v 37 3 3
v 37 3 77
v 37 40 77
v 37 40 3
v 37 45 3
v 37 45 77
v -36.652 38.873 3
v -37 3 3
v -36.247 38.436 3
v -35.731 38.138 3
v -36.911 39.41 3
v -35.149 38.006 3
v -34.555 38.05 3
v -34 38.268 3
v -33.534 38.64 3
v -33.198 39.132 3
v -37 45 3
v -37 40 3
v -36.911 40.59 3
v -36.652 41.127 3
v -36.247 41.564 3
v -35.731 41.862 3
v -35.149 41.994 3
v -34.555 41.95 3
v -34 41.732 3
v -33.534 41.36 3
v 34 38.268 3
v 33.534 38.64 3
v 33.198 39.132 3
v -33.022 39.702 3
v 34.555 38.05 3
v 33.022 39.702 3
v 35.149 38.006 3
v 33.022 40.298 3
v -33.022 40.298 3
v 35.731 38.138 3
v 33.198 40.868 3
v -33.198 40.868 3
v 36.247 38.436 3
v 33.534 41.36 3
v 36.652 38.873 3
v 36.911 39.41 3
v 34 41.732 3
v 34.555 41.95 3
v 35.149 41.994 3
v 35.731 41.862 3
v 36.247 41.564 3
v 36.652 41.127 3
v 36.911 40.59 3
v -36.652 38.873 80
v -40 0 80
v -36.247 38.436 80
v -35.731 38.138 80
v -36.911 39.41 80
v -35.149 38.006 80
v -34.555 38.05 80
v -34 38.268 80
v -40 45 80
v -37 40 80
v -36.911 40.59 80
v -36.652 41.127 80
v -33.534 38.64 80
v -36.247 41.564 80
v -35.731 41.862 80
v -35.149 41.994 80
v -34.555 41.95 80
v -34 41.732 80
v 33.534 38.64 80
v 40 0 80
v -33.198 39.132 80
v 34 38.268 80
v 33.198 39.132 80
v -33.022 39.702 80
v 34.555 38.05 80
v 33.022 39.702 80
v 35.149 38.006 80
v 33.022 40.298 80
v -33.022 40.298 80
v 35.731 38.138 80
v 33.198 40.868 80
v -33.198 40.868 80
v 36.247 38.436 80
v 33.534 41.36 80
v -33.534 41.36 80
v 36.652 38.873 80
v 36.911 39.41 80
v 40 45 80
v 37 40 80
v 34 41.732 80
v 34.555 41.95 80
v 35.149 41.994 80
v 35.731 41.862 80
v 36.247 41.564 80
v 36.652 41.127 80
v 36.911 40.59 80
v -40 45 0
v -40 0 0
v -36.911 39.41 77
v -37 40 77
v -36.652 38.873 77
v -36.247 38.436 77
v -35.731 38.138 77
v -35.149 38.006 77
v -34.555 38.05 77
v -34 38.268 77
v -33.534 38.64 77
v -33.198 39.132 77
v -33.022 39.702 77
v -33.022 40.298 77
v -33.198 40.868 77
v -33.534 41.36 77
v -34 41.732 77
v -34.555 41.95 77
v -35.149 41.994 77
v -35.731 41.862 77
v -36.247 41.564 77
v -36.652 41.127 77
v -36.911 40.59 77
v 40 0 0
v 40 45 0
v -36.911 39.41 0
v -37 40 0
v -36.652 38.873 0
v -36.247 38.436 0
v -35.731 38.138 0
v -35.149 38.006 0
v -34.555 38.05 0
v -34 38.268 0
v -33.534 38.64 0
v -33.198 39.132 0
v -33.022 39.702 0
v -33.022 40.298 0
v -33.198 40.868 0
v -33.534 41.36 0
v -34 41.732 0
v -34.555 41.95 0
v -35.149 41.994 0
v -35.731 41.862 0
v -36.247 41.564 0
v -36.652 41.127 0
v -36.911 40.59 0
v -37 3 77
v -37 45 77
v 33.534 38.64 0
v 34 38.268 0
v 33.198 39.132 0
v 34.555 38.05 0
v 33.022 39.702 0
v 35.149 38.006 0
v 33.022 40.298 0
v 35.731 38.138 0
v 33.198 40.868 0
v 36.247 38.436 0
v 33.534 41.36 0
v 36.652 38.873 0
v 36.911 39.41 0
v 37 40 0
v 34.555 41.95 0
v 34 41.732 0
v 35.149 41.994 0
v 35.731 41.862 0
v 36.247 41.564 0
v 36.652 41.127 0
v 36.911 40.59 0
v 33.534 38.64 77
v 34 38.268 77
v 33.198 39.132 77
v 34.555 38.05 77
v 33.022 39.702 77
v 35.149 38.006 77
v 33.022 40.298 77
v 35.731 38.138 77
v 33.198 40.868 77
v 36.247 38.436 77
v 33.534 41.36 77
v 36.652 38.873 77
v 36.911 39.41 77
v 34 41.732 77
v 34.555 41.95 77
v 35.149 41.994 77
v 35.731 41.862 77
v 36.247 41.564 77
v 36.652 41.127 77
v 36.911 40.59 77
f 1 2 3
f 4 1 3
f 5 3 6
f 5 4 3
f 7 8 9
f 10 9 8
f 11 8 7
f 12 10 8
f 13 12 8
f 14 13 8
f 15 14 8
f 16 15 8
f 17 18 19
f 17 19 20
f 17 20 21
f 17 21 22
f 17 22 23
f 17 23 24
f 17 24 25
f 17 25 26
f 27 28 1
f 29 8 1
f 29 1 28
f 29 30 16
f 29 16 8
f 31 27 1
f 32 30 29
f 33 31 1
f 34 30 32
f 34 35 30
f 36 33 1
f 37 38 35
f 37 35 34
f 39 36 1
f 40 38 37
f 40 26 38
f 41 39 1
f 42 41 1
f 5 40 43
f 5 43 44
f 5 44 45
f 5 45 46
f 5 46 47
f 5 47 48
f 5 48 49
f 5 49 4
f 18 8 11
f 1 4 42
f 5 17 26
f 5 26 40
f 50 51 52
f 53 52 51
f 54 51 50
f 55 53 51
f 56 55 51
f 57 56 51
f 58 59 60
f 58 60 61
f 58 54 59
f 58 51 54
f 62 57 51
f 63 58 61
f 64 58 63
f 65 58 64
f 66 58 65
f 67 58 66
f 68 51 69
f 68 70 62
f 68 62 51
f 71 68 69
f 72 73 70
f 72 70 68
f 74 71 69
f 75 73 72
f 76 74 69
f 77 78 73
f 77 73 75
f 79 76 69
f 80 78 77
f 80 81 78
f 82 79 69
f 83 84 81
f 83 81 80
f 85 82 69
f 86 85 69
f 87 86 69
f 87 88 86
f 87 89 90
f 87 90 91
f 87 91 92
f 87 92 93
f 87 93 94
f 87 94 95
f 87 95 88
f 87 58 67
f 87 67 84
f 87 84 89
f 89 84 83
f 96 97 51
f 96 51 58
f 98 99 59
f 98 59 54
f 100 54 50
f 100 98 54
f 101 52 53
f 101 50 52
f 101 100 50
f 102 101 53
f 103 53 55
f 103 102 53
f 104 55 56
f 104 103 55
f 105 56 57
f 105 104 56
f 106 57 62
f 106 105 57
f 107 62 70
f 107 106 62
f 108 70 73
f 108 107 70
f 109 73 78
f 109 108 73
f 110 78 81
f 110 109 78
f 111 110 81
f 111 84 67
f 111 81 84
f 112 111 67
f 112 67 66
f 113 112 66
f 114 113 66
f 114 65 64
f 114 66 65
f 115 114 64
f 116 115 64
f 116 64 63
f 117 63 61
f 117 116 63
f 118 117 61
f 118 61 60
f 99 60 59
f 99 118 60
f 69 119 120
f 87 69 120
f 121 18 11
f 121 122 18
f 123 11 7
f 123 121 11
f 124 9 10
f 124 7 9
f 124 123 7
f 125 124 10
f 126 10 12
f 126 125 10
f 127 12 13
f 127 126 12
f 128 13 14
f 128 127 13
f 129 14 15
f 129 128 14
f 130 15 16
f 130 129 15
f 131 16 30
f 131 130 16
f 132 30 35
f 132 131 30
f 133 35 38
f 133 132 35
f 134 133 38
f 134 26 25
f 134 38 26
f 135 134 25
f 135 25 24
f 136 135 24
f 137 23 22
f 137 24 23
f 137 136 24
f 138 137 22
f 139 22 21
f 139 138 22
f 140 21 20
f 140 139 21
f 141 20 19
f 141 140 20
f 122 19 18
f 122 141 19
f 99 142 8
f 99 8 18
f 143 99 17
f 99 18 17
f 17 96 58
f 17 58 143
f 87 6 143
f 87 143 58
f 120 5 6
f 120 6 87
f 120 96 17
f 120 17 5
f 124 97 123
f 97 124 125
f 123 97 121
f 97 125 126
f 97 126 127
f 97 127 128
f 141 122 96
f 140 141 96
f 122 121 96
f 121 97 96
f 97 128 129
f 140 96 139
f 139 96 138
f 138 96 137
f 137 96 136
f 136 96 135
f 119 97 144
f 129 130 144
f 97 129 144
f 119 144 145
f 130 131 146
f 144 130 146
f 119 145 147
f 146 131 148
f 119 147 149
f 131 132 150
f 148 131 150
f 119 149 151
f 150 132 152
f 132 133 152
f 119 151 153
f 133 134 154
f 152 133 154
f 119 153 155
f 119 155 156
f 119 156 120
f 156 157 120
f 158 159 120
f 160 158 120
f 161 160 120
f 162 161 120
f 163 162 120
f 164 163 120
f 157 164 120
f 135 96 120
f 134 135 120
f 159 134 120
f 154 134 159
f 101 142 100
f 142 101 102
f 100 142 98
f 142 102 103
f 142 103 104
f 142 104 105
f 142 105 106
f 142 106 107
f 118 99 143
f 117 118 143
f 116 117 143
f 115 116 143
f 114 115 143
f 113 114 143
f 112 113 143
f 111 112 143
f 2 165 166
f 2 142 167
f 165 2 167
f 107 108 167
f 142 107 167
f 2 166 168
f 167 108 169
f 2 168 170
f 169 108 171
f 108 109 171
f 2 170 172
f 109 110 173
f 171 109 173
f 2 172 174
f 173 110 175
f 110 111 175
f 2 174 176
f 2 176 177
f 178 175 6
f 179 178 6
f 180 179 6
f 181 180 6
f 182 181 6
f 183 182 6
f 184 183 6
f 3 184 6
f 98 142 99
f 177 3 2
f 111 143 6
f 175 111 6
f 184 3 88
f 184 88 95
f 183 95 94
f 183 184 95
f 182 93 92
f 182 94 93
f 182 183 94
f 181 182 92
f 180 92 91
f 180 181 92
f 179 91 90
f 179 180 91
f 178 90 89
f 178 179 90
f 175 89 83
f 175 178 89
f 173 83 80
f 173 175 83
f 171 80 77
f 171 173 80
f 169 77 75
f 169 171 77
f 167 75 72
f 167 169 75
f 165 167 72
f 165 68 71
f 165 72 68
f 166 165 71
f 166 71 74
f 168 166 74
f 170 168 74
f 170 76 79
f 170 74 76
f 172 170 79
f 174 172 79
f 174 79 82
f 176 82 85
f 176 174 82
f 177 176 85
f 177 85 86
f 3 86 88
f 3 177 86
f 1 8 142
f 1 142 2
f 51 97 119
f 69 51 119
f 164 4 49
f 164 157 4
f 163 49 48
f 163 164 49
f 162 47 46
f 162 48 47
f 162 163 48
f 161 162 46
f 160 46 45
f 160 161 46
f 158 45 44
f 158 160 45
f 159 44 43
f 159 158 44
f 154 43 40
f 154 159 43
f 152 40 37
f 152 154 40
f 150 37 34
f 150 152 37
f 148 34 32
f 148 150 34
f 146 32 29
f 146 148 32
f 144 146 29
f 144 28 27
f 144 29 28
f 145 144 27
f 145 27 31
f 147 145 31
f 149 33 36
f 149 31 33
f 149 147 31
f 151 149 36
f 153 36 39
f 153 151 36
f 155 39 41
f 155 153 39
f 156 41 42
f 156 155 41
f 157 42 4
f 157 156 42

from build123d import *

# Parameters (mm, degrees)
BOSS_EXTRUDE1_DEPTH     = 80
SHELL1_T                = -3
CUT_EXTRUDE3_DEPTH      = 101.124921973
CUT_EXTRUDE3_DEPTH_BACK = 101.124921973
SKETCH1_3_R             = 2


with BuildPart() as part:
    # Sketch1 → Boss-Extrude1 (new body)
    with BuildSketch(Plane.XY):
        Polygon((-40, 0), (40, 0), (40, 45), (35, 45), (-40, 45), align=None)
    extrude(amount=BOSS_EXTRUDE1_DEPTH)

    # Shell1
    shell1_openings = [part.faces().sort_by_distance(p)[0] for p in [
        (0, 45, 40),
    ]]
    offset(amount=SHELL1_T, openings=shell1_openings, kind=Kind.INTERSECTION)

    # Sketch1<3> → Cut-Extrude3 (cut, two sides: drawn at the far end of the back side and taken through both)
    with BuildSketch(Plane.XY.offset(-CUT_EXTRUDE3_DEPTH_BACK)):
        with Locations((35, 40)):
            Circle(SKETCH1_3_R)
        with Locations((-35, 40)):
            Circle(SKETCH1_3_R)
    extrude(amount=CUT_EXTRUDE3_DEPTH + CUT_EXTRUDE3_DEPTH_BACK, mode=Mode.SUBTRACT)


solid = part.part
